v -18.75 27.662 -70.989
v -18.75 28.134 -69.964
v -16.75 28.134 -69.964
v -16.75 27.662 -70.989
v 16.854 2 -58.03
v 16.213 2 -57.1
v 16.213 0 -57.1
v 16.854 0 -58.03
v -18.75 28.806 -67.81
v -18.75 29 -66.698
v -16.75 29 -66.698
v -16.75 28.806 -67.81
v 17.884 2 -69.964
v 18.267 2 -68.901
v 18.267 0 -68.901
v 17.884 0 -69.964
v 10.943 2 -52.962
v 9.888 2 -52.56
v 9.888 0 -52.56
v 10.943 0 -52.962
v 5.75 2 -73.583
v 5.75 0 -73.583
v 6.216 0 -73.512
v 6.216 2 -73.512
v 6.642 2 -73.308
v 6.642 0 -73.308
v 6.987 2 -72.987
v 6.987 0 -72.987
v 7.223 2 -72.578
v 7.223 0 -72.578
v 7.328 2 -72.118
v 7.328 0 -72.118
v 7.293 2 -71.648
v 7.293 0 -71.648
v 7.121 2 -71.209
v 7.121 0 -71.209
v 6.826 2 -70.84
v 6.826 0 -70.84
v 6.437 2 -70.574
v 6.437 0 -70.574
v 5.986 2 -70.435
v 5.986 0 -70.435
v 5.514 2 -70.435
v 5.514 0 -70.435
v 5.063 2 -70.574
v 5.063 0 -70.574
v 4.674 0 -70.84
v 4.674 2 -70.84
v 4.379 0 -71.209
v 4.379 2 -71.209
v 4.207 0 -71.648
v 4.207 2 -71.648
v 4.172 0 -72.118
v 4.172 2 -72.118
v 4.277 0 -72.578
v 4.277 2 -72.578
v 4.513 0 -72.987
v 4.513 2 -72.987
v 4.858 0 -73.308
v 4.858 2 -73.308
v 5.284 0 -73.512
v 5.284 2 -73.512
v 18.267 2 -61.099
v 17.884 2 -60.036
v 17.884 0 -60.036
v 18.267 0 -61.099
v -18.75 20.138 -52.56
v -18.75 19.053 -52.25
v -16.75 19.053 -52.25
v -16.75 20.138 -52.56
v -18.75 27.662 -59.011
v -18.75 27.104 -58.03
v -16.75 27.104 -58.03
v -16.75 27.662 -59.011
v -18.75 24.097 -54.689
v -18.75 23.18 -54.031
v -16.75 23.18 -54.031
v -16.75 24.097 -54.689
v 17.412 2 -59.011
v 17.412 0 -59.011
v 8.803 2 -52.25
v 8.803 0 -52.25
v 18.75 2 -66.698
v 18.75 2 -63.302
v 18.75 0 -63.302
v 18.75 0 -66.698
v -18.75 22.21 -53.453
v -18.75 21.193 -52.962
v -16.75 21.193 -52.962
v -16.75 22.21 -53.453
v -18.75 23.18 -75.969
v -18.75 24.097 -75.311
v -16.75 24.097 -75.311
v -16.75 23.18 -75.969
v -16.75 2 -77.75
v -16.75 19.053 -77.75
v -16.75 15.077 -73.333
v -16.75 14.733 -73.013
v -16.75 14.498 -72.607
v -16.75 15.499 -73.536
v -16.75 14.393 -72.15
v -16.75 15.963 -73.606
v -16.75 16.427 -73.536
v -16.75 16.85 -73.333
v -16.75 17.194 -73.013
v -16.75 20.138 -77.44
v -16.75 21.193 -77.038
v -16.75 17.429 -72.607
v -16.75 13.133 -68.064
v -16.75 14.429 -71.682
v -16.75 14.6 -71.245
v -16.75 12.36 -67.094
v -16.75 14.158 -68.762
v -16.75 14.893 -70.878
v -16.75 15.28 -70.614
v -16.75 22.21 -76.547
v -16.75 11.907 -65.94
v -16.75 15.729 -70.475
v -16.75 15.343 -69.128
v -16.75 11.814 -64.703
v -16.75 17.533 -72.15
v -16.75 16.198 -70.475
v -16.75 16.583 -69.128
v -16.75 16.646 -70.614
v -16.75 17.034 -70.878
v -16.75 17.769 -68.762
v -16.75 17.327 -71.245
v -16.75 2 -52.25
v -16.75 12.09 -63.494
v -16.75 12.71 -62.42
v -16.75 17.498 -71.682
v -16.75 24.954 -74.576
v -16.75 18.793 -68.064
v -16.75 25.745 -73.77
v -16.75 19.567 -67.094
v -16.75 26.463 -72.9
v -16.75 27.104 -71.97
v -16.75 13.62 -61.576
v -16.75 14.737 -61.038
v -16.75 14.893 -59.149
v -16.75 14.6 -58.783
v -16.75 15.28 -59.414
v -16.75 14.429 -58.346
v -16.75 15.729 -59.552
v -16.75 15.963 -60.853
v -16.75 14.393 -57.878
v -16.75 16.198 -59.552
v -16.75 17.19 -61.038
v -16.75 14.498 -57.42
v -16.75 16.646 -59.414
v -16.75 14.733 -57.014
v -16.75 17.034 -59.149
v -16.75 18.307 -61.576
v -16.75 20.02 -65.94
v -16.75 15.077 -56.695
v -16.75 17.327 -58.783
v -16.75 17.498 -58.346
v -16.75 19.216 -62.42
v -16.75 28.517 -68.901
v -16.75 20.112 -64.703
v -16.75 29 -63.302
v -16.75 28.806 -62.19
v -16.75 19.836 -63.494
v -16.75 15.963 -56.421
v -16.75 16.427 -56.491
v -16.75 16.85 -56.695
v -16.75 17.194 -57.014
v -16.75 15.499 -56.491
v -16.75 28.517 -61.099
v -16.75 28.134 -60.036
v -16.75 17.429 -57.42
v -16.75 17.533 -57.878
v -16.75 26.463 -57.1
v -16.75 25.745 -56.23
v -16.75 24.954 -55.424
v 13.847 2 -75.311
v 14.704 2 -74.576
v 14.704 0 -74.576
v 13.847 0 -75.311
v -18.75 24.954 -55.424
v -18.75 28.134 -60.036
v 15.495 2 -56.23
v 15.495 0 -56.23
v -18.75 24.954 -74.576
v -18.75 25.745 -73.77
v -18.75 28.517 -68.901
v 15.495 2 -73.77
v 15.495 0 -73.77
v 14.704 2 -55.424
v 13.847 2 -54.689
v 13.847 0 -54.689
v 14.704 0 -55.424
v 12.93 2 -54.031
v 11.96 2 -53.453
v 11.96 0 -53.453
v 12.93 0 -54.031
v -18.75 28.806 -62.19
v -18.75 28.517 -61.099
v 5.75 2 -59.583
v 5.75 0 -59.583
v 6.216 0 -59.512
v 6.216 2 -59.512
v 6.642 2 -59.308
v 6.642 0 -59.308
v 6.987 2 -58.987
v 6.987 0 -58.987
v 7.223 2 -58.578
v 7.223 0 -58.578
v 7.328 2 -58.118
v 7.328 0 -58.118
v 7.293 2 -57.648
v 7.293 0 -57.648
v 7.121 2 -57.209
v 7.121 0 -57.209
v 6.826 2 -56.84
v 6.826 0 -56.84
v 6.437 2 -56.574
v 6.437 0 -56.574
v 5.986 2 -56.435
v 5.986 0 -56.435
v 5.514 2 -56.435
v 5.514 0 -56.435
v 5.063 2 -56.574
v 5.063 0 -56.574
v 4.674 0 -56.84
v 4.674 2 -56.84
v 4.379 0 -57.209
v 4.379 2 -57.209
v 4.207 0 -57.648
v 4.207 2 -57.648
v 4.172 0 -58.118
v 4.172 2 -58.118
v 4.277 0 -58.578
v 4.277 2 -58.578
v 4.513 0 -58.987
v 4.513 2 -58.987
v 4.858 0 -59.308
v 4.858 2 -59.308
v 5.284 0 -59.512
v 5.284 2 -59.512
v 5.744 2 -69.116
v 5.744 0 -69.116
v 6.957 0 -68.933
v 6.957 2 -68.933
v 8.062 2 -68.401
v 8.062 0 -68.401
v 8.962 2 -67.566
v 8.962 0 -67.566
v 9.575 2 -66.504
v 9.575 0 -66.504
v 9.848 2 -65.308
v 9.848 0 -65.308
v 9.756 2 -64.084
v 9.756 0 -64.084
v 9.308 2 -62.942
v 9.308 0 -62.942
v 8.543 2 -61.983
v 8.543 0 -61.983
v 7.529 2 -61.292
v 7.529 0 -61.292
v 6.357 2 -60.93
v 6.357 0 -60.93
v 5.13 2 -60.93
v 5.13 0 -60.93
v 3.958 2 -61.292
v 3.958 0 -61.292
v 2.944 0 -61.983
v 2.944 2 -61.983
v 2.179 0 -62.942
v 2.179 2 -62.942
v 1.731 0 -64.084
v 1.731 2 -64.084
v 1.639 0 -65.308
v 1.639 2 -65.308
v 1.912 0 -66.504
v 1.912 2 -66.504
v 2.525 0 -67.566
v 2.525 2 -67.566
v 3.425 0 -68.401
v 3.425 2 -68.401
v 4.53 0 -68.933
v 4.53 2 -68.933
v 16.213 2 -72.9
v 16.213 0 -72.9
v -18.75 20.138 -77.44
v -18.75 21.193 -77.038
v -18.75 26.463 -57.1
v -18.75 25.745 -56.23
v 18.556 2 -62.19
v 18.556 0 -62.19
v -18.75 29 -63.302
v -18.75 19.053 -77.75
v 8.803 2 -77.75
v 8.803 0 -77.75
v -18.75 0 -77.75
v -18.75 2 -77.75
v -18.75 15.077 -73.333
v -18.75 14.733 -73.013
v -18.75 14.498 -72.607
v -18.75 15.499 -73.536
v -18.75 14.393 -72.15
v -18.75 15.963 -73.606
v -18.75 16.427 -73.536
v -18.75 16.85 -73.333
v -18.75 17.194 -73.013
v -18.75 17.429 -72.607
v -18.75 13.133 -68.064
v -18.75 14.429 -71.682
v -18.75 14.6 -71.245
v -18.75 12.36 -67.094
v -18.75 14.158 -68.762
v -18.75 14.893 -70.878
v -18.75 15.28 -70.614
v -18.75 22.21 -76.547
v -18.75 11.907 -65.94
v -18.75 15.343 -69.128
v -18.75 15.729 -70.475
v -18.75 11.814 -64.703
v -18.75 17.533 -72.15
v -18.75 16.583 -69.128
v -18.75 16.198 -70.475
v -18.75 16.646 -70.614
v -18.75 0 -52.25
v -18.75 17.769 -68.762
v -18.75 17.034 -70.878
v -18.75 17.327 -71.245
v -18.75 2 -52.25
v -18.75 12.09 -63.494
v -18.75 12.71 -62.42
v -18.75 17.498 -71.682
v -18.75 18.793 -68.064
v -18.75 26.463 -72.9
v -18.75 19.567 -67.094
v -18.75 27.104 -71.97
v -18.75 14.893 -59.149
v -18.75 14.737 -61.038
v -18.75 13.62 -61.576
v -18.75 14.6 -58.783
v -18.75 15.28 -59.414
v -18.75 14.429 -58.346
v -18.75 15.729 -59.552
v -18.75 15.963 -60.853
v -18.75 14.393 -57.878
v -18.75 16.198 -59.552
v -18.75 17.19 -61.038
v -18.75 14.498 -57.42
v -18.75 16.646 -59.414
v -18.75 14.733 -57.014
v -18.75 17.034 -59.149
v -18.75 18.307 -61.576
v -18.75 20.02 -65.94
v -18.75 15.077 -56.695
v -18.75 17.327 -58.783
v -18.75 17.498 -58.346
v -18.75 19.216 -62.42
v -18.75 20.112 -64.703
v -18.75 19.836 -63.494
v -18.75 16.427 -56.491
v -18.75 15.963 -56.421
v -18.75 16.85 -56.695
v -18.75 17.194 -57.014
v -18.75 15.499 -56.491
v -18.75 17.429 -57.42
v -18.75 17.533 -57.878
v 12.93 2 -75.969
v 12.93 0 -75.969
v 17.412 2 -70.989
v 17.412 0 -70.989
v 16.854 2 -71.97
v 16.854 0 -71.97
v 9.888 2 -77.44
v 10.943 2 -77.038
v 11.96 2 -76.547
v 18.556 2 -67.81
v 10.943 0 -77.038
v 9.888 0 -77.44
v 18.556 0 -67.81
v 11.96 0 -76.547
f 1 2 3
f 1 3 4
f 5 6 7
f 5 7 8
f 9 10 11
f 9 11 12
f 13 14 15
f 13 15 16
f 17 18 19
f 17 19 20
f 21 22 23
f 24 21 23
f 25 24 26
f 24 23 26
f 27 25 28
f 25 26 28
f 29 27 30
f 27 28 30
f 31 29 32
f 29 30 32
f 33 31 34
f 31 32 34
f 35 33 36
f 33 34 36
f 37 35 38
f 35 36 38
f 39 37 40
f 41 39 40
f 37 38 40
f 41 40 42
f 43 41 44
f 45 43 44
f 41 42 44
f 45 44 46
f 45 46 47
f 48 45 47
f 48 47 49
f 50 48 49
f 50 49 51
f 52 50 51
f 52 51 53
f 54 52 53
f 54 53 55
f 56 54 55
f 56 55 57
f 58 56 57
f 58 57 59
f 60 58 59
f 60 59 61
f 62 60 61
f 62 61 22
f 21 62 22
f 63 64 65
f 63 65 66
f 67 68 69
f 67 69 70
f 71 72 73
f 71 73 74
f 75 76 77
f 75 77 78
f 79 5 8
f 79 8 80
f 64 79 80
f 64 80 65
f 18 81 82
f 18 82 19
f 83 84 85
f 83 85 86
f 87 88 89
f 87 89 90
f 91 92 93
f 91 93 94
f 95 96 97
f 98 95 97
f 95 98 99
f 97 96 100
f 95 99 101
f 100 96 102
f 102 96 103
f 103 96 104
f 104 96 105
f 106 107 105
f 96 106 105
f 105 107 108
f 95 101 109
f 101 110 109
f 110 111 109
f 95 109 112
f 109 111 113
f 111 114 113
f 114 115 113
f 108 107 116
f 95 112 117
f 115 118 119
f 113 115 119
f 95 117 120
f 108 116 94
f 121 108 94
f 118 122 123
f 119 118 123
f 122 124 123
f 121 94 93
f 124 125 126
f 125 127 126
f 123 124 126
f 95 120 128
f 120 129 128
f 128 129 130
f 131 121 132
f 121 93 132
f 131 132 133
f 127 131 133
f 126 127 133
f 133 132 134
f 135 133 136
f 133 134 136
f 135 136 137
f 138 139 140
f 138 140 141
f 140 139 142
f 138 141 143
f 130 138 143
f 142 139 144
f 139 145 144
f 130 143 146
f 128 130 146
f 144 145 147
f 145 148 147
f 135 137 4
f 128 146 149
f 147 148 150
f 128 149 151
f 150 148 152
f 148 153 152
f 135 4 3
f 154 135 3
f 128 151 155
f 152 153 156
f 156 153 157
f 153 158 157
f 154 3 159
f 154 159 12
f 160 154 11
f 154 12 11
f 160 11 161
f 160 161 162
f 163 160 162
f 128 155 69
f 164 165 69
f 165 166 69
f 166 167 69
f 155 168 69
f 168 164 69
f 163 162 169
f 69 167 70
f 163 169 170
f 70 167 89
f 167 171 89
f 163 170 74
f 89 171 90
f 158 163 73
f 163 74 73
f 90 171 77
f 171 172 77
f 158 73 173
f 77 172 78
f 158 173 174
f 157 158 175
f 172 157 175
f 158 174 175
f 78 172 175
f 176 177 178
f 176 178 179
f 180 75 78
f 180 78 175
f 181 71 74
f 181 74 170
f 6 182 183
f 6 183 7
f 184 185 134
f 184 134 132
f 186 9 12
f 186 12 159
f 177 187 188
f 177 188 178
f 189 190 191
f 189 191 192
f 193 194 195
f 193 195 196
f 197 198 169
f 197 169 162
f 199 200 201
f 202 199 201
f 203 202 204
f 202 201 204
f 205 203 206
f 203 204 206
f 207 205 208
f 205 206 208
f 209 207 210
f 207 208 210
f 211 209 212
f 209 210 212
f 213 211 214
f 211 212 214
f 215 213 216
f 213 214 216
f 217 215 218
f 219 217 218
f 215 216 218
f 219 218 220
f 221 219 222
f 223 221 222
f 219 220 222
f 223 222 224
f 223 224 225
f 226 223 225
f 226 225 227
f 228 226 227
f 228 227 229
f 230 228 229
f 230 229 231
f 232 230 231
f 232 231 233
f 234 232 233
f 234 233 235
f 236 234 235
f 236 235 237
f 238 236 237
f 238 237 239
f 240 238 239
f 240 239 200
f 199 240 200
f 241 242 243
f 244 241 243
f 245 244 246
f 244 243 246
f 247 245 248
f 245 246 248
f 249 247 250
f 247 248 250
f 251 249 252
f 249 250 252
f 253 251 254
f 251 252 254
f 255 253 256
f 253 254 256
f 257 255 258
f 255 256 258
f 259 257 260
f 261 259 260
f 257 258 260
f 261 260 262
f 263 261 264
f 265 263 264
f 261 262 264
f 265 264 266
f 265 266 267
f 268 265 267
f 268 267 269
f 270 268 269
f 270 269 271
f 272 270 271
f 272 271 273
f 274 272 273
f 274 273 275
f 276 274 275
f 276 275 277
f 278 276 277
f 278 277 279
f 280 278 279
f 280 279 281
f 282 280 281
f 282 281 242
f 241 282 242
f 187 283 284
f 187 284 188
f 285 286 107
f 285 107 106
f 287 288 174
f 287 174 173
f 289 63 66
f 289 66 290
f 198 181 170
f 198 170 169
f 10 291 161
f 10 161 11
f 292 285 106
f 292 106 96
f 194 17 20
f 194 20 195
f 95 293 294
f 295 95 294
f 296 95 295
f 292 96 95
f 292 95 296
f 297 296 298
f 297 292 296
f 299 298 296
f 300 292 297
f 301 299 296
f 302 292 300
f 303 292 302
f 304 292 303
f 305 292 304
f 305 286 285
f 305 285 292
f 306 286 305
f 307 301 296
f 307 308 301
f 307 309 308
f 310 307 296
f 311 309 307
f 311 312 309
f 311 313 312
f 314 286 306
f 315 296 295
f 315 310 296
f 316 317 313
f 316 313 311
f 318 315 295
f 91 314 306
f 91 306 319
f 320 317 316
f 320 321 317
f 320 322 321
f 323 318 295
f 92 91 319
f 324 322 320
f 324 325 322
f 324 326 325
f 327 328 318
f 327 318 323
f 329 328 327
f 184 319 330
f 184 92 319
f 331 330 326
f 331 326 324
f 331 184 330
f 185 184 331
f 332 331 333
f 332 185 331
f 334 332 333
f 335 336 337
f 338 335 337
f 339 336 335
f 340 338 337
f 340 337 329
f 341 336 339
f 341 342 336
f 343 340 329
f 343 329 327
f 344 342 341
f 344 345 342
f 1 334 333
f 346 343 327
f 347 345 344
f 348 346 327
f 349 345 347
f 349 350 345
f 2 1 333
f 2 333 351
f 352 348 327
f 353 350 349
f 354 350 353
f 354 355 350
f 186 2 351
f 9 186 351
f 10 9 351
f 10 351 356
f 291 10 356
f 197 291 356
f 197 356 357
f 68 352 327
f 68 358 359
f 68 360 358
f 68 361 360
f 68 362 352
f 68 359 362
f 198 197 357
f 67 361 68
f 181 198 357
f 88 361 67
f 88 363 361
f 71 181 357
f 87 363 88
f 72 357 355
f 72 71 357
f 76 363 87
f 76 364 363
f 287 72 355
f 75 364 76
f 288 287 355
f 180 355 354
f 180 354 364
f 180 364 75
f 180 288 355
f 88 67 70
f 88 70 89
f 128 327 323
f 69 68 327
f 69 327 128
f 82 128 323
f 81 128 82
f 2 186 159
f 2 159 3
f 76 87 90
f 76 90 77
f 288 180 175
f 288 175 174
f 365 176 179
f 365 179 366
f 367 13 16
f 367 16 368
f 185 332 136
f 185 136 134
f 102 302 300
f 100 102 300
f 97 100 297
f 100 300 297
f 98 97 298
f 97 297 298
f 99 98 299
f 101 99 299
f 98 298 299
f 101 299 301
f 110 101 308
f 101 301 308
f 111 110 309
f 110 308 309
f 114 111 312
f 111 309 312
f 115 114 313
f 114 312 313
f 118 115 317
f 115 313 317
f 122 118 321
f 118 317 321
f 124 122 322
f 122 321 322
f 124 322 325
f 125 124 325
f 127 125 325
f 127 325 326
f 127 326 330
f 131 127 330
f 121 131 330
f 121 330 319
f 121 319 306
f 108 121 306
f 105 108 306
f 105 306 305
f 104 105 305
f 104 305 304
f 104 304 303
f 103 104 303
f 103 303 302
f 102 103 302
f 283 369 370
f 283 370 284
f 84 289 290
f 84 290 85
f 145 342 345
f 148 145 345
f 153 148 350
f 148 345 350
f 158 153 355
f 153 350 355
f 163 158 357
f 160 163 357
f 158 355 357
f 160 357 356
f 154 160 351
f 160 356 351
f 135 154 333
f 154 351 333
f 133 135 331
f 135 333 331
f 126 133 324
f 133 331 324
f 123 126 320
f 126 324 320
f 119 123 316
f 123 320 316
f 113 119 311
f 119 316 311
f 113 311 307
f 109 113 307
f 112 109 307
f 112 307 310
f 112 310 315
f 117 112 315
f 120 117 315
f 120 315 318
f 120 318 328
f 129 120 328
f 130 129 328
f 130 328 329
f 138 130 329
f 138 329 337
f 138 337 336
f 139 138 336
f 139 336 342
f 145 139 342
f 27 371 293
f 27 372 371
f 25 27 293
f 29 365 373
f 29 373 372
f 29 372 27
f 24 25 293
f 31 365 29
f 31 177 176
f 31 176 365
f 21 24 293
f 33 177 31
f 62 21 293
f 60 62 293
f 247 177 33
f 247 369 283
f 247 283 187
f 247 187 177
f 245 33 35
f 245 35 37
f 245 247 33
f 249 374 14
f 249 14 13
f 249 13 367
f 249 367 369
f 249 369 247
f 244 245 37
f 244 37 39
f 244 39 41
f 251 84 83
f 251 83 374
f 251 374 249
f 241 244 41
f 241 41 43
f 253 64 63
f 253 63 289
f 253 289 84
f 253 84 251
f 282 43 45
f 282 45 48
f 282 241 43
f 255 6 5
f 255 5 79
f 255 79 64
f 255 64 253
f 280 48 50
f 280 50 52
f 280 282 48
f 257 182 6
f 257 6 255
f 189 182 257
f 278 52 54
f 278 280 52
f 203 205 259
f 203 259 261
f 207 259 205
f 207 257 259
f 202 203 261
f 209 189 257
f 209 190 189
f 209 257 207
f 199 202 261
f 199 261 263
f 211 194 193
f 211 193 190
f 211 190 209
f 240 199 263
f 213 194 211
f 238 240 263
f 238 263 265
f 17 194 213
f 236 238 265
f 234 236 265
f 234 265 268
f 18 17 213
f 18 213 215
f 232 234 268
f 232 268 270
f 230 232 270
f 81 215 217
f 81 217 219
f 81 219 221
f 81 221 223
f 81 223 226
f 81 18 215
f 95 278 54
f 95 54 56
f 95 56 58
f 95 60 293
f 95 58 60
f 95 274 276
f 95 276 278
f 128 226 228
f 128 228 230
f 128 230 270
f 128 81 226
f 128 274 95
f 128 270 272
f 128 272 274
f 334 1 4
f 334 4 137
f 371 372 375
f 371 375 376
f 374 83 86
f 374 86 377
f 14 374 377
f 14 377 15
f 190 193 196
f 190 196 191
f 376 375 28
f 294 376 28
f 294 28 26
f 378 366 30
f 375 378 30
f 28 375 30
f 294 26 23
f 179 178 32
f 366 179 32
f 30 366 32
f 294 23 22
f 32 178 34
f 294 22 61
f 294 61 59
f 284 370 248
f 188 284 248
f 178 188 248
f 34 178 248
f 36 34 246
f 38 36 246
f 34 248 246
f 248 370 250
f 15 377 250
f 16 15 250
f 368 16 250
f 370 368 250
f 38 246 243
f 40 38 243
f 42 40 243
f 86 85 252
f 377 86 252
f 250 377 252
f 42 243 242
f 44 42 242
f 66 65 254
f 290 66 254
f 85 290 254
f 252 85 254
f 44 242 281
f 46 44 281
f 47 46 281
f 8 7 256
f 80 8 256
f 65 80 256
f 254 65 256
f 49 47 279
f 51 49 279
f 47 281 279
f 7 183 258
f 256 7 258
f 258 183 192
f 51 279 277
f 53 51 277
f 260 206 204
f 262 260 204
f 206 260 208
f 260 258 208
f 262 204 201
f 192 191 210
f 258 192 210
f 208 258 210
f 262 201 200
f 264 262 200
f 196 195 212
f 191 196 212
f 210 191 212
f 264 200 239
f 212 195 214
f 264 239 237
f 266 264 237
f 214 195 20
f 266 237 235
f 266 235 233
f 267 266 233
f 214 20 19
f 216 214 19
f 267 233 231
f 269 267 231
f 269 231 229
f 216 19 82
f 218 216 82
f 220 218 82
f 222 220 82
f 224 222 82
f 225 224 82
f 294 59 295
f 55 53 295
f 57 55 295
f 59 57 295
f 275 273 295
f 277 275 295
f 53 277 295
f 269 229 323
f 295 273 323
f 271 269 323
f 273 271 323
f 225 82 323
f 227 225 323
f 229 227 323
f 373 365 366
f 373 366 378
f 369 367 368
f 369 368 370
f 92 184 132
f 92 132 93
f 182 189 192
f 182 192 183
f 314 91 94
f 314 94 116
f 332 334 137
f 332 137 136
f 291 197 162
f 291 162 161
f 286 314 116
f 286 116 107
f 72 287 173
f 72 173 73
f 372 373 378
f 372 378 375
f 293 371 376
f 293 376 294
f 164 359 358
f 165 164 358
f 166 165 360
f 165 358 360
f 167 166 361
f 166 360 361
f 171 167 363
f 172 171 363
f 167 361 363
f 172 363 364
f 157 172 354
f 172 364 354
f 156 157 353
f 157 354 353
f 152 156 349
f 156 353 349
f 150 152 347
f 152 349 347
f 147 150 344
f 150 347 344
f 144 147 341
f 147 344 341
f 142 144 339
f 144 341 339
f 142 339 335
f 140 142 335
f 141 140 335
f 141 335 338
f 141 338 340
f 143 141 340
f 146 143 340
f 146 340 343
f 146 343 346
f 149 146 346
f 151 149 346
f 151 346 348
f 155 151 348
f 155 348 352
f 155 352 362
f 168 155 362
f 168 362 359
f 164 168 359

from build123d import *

# Parameters (mm, degrees)
SALIENTE_EXTRUIR1_DEPTH = 2.000000328
CROQUIS2_W              = 2.000000328
CROQUIS2_H              = 25.499995797
SALIENTE_EXTRUIR2_DEPTH = 17.052894691
SALIENTE_EXTRUIR3_DEPTH = 2.000000095
CORTAR_EXTRUIR1_DEPTH   = 92.062133489
CORTAR_EXTRUIR2_DEPTH   = 92.062133489
CORTAR_EXTRUIR3_DEPTH   = 85.413414633
CORTAR_EXTRUIR4_DEPTH   = 85.413414633
CORTAR_EXTRUIR5_DEPTH   = 85.413414633
CORTAR_EXTRUIR6_DEPTH   = 91.256922872
CROQUIS10_R             = 4.160635969
CROQUIS10_R_2           = 1.574242088
CORTAR_EXTRUIR7_DEPTH   = 92.062133489
CROQUIS11_R             = 4.116064073
CROQUIS11_R_2           = 1.582596422
CORTAR_EXTRUIR8_DEPTH   = 86.074229775


with BuildPart() as part:
    # Croquis1 → Saliente-Extruir1 (new body)
    with BuildSketch(Plane(origin=(-18.750000745, 0, 0), x_dir=(0, -1, 0), z_dir=(-1, 0, 0))):
        Polygon((-19.052894786, -77.749997377), (-19.052894786, -52.25000158), (-20.138457417, -52.559908479), (-21.193336695, -52.962061018), (-22.209705785, -53.453475237), (-23.180030286, -54.030507803), (-24.097116664, -54.688870907), (-24.954162538, -55.423695594), (-25.744814426, -56.229524314), (-26.46320872, -57.100389153), (-27.104021981, -58.029823005), (-27.662498876, -59.010945261), (-28.134498745, -60.036472976), (-28.51652354, -61.098802835), (-28.805738315, -62.190063298), (-28.999999166, -63.302159309), (-28.999999166, -66.697835922), (-28.805738315, -67.809939384), (-28.51652354, -68.901196122), (-28.134498745, -69.963529706), (-27.662498876, -70.989057422), (-27.104021981, -71.970179677), (-26.46320872, -72.899609804), (-25.744814426, -73.770478368), (-24.954162538, -74.576310813), (-24.097116664, -75.311124325), (-23.180030286, -75.969494879), (-22.209705785, -76.546527445), (-21.193336695, -77.037930489), (-20.138457417, -77.440083027), align=None)
    extrude(amount=-SALIENTE_EXTRUIR1_DEPTH)

    # Croquis2 → Saliente-Extruir2 (add)
    with BuildSketch(Plane.XZ.offset(-19.052894786)):
        with Locations((-17.750000581, -64.999999479)):
            Rectangle(CROQUIS2_W, CROQUIS2_H)
    extrude(amount=SALIENTE_EXTRUIR2_DEPTH)

    # Croquis3 → Saliente-Extruir3 (add)
    with BuildSketch(Plane.XZ.offset(-2.000000095)):
        Polygon((8.802894503, -77.749997377), (-18.750000745, -77.749997377), (-18.750000745, -52.25000158), (8.802894503, -52.25000158), (9.888458066, -52.559908479), (10.943335481, -52.962061018), (11.959705502, -53.453475237), (12.930030003, -54.030507803), (13.84711545, -54.688870907), (14.704162255, -55.423695594), (15.494815074, -56.229524314), (16.213208437, -57.100389153), (16.854021698, -58.029823005), (17.412498593, -59.010945261), (17.884498462, -60.036472976), (18.266523257, -61.098802835), (18.555738032, -62.190063298), (18.750000745, -63.302159309), (18.750000745, -66.697835922), (18.555738032, -67.809939384), (18.266523257, -68.901196122), (17.884498462, -69.963529706), (17.412498593, -70.989057422), (16.854021698, -71.970179677), (16.213208437, -72.899609804), (15.494815074, -73.770478368), (14.704162255, -74.576310813), (13.84711545, -75.311124325), (12.930030003, -75.969494879), (11.959705502, -76.546527445), (10.943335481, -77.037930489), (9.888458066, -77.440083027), align=None)
    extrude(amount=SALIENTE_EXTRUIR3_DEPTH)

    # Croquis4 → Cortar-Extruir1 (cut, through all)
    with BuildSketch(Plane.ZY.offset(18.750000745)):
        Polygon((-67.884810269, 13.229101896), (-67.402966321, 12.802229263), (-66.858895123, 12.458175421), (-66.266670823, 12.205854058), (-65.641649067, 12.051798403), (-64.999997616, 12.000000104), (-64.358353615, 12.051798403), (-63.733331859, 12.205854058), (-63.141107559, 12.458175421), (-62.597028911, 12.802229263), (-62.115188688, 13.229101896), (-61.708066612, 13.727741316), (-61.386201531, 14.285230078), (-61.157926917, 14.887129888), (-61.029162258, 15.517854132), (-61.003241688, 16.161063686), (-61.08083576, 16.800101846), (-61.259932816, 17.41841808), (-61.535898596, 17.999999225), (-61.901580542, 18.529782072), (-62.347508967, 18.99404265), (-62.86213547, 19.380759448), (-63.432134688, 19.679918885), (-64.04273957, 19.883768633), (-64.678132534, 19.987029955), (-65.321870148, 19.987029955), (-65.957263112, 19.883768633), (-66.567860544, 19.679918885), (-67.137859762, 19.380759448), (-67.652486265, 18.99404265), (-68.098418415, 18.529782072), (-68.464100361, 17.999999225), (-68.740069866, 17.41841808), (-68.919159472, 16.800101846), (-68.996757269, 16.161063686), (-68.970829248, 15.517854132), (-68.842068315, 14.887129888), (-68.613797426, 14.285230078), (-68.291939795, 13.727741316), align=None)
    extrude(amount=-CORTAR_EXTRUIR1_DEPTH, mode=Mode.SUBTRACT)

    # Croquis5 → Cortar-Extruir2 (cut, through all)
    with BuildSketch(Plane.ZY.offset(18.750000745)):
        Polygon((-57.250000536, 14.700962231), (-56.939337403, 14.939339831), (-56.700963527, 15.250000171), (-56.551113725, 15.611771494), (-56.499999017, 16.00000076), (-56.551113725, 16.388230026), (-56.700963527, 16.750000417), (-56.939337403, 17.060659826), (-57.250000536, 17.299037427), (-57.611770928, 17.448889092), (-57.999998331, 17.500000075), (-58.38822946, 17.448889092), (-58.749999851, 17.299037427), (-59.060662985, 17.060659826), (-59.29903686, 16.750000417), (-59.448886663, 16.388230026), (-59.500001371, 16.00000076), (-59.448886663, 15.611771494), (-59.29903686, 15.250000171), (-59.060662985, 14.939339831), (-58.749999851, 14.700962231), (-58.38822946, 14.551111497), (-57.999998331, 14.499999583), (-57.611770928, 14.551111497), align=None)
    extrude(amount=-CORTAR_EXTRUIR2_DEPTH, mode=Mode.SUBTRACT)

    # Croquis6 → Cortar-Extruir3 (cut, through all)
    with BuildSketch(Plane(origin=(0, 2.000000095, 0), x_dir=(-1, 0, 0), z_dir=(0, 1, 0))):
        Polygon((-4.450961947, -57.250000536), (-4.689339548, -56.939337403), (-4.999999888, -56.700963527), (-5.361771677, -56.551113725), (-5.750000011, -56.499999017), (-6.138228346, -56.551113725), (-6.500000134, -56.700963527), (-6.810660474, -56.939337403), (-7.049038075, -57.250000536), (-7.198888808, -57.611770928), (-7.249999791, -57.999998331), (-7.198888808, -58.38822946), (-7.049038075, -58.749999851), (-6.810660474, -59.060662985), (-6.500000134, -59.29903686), (-6.138228346, -59.448886663), (-5.750000011, -59.500001371), (-5.361771677, -59.448886663), (-4.999999888, -59.29903686), (-4.689339548, -59.060662985), (-4.450961947, -58.749999851), (-4.301111214, -58.38822946), (-4.250000231, -57.999998331), (-4.301111214, -57.611770928), align=None)
    extrude(amount=-CORTAR_EXTRUIR3_DEPTH, mode=Mode.SUBTRACT)

    # Croquis7 → Cortar-Extruir4 (cut, through all)
    with BuildSketch(Plane(origin=(0, 2.000000095, 0), x_dir=(-1, 0, 0), z_dir=(0, 1, 0))):
        Polygon((-5.750000011, -73.49999994), (-5.361771677, -73.448888958), (-4.999999888, -73.299042881), (-4.689339548, -73.060661554), (-4.450961947, -72.750002146), (-4.301111214, -72.388231754), (-4.250000231, -71.999996901), (-4.301111214, -71.611769497), (-4.450961947, -71.249999106), (-4.689339548, -70.939339697), (-4.999999888, -70.700958371), (-5.361771677, -70.551112294), (-5.750000011, -70.500001311), (-6.138228346, -70.551112294), (-6.500000134, -70.700958371), (-6.810660474, -70.939339697), (-7.049038075, -71.249999106), (-7.198888808, -71.611769497), (-7.249999791, -71.999996901), (-7.198888808, -72.388231754), (-7.049038075, -72.750002146), (-6.810660474, -73.060661554), (-6.500000134, -73.299042881), (-6.138228346, -73.448888958), align=None)
    extrude(amount=-CORTAR_EXTRUIR4_DEPTH, mode=Mode.SUBTRACT)

    # Croquis8 → Cortar-Extruir5 (cut, through all)
    with BuildSketch(Plane(origin=(0, 2.000000095, 0), x_dir=(-1, 0, 0), z_dir=(0, 1, 0))):
        Polygon((-2.208175836, -63.141107559), (-2.55222898, -62.597028911), (-2.979102544, -62.115188688), (-3.477741033, -61.708066612), (-4.035229795, -61.386201531), (-4.63713007, -61.157926917), (-5.267853383, -61.029162258), (-5.911063869, -61.003241688), (-6.550102495, -61.08083576), (-7.168419193, -61.259932816), (-7.749999873, -61.535898596), (-8.279781789, -61.901580542), (-8.744043298, -62.347508967), (-9.130760096, -62.86213547), (-9.429917671, -63.432134688), (-9.633767419, -64.04273957), (-9.73702874, -64.678132534), (-9.73702874, -65.321870148), (-9.633767419, -65.957263112), (-9.429917671, -66.567860544), (-9.130760096, -67.137859762), (-8.744043298, -67.652486265), (-8.279781789, -68.098418415), (-7.749999873, -68.464100361), (-7.168419193, -68.740069866), (-6.550102495, -68.919159472), (-5.911063869, -68.996757269), (-5.267853383, -68.970829248), (-4.63713007, -68.842068315), (-4.035229795, -68.613797426), (-3.477741033, -68.291939795), (-2.979102544, -67.884810269), (-2.55222898, -67.402966321), (-2.208175836, -66.858895123), (-1.955854241, -66.266670823), (-1.801798935, -65.641649067), (-1.750000054, -64.999997616), (-1.801798935, -64.358353615), (-1.955854241, -63.733331859), align=None)
    extrude(amount=-CORTAR_EXTRUIR5_DEPTH, mode=Mode.SUBTRACT)

    # Croquis9 → Cortar-Extruir6 (cut, through all)
    with BuildSketch(Plane(origin=(-16.750000417, 0, 0), x_dir=(0, 0, -1), z_dir=(1, 0, 0))):
        Polygon((72.750002146, 14.700962231), (73.060661554, 14.939339831), (73.299042881, 15.250000171), (73.448888958, 15.611771494), (73.49999994, 16.00000076), (73.448888958, 16.388230026), (73.299042881, 16.750000417), (73.060661554, 17.060659826), (72.750002146, 17.299037427), (72.388231754, 17.448889092), (71.999996901, 17.500000075), (71.611769497, 17.448889092), (71.249999106, 17.299037427), (70.939339697, 17.060659826), (70.700958371, 16.750000417), (70.551112294, 16.388230026), (70.500001311, 16.00000076), (70.551112294, 15.611771494), (70.700958371, 15.250000171), (70.939339697, 14.939339831), (71.249999106, 14.700962231), (71.611769497, 14.551111497), (71.999996901, 14.499999583), (72.388231754, 14.551111497), align=None)
    extrude(amount=-CORTAR_EXTRUIR6_DEPTH, mode=Mode.SUBTRACT)

    # Croquis10 → Cortar-Extruir7 (cut, through all)
    with BuildSketch(Plane.ZY.offset(18.750000745)):
        with Locations((-65.013688685, 15.96331425)):
            Circle(CROQUIS10_R)
        with Locations((-57.995421153, 15.96331425)):
            Circle(CROQUIS10_R_2)
        with Locations(Location((-72.031956216, 15.96331425, 0), (0, 0, 180))):
            Circle(CROQUIS10_R_2)
    extrude(amount=-CORTAR_EXTRUIR7_DEPTH, mode=Mode.SUBTRACT)

    # Croquis11 → Cortar-Extruir8 (cut, through all)
    with BuildSketch(Plane.XZ):
        with Locations(Location((5.743514397, -64.999997616, 0), (0, 0, 270))):
            Circle(CROQUIS11_R)
        with Locations(Location((5.750000011, -57.999998331, 0), (0, 0, 270))):
            Circle(CROQUIS11_R_2)
        with Locations(Location((5.750000011, -71.999996901, 0), (0, 0, 270))):
            Circle(CROQUIS11_R_2)
    extrude(amount=-CORTAR_EXTRUIR8_DEPTH, mode=Mode.SUBTRACT)


solid = part.part
